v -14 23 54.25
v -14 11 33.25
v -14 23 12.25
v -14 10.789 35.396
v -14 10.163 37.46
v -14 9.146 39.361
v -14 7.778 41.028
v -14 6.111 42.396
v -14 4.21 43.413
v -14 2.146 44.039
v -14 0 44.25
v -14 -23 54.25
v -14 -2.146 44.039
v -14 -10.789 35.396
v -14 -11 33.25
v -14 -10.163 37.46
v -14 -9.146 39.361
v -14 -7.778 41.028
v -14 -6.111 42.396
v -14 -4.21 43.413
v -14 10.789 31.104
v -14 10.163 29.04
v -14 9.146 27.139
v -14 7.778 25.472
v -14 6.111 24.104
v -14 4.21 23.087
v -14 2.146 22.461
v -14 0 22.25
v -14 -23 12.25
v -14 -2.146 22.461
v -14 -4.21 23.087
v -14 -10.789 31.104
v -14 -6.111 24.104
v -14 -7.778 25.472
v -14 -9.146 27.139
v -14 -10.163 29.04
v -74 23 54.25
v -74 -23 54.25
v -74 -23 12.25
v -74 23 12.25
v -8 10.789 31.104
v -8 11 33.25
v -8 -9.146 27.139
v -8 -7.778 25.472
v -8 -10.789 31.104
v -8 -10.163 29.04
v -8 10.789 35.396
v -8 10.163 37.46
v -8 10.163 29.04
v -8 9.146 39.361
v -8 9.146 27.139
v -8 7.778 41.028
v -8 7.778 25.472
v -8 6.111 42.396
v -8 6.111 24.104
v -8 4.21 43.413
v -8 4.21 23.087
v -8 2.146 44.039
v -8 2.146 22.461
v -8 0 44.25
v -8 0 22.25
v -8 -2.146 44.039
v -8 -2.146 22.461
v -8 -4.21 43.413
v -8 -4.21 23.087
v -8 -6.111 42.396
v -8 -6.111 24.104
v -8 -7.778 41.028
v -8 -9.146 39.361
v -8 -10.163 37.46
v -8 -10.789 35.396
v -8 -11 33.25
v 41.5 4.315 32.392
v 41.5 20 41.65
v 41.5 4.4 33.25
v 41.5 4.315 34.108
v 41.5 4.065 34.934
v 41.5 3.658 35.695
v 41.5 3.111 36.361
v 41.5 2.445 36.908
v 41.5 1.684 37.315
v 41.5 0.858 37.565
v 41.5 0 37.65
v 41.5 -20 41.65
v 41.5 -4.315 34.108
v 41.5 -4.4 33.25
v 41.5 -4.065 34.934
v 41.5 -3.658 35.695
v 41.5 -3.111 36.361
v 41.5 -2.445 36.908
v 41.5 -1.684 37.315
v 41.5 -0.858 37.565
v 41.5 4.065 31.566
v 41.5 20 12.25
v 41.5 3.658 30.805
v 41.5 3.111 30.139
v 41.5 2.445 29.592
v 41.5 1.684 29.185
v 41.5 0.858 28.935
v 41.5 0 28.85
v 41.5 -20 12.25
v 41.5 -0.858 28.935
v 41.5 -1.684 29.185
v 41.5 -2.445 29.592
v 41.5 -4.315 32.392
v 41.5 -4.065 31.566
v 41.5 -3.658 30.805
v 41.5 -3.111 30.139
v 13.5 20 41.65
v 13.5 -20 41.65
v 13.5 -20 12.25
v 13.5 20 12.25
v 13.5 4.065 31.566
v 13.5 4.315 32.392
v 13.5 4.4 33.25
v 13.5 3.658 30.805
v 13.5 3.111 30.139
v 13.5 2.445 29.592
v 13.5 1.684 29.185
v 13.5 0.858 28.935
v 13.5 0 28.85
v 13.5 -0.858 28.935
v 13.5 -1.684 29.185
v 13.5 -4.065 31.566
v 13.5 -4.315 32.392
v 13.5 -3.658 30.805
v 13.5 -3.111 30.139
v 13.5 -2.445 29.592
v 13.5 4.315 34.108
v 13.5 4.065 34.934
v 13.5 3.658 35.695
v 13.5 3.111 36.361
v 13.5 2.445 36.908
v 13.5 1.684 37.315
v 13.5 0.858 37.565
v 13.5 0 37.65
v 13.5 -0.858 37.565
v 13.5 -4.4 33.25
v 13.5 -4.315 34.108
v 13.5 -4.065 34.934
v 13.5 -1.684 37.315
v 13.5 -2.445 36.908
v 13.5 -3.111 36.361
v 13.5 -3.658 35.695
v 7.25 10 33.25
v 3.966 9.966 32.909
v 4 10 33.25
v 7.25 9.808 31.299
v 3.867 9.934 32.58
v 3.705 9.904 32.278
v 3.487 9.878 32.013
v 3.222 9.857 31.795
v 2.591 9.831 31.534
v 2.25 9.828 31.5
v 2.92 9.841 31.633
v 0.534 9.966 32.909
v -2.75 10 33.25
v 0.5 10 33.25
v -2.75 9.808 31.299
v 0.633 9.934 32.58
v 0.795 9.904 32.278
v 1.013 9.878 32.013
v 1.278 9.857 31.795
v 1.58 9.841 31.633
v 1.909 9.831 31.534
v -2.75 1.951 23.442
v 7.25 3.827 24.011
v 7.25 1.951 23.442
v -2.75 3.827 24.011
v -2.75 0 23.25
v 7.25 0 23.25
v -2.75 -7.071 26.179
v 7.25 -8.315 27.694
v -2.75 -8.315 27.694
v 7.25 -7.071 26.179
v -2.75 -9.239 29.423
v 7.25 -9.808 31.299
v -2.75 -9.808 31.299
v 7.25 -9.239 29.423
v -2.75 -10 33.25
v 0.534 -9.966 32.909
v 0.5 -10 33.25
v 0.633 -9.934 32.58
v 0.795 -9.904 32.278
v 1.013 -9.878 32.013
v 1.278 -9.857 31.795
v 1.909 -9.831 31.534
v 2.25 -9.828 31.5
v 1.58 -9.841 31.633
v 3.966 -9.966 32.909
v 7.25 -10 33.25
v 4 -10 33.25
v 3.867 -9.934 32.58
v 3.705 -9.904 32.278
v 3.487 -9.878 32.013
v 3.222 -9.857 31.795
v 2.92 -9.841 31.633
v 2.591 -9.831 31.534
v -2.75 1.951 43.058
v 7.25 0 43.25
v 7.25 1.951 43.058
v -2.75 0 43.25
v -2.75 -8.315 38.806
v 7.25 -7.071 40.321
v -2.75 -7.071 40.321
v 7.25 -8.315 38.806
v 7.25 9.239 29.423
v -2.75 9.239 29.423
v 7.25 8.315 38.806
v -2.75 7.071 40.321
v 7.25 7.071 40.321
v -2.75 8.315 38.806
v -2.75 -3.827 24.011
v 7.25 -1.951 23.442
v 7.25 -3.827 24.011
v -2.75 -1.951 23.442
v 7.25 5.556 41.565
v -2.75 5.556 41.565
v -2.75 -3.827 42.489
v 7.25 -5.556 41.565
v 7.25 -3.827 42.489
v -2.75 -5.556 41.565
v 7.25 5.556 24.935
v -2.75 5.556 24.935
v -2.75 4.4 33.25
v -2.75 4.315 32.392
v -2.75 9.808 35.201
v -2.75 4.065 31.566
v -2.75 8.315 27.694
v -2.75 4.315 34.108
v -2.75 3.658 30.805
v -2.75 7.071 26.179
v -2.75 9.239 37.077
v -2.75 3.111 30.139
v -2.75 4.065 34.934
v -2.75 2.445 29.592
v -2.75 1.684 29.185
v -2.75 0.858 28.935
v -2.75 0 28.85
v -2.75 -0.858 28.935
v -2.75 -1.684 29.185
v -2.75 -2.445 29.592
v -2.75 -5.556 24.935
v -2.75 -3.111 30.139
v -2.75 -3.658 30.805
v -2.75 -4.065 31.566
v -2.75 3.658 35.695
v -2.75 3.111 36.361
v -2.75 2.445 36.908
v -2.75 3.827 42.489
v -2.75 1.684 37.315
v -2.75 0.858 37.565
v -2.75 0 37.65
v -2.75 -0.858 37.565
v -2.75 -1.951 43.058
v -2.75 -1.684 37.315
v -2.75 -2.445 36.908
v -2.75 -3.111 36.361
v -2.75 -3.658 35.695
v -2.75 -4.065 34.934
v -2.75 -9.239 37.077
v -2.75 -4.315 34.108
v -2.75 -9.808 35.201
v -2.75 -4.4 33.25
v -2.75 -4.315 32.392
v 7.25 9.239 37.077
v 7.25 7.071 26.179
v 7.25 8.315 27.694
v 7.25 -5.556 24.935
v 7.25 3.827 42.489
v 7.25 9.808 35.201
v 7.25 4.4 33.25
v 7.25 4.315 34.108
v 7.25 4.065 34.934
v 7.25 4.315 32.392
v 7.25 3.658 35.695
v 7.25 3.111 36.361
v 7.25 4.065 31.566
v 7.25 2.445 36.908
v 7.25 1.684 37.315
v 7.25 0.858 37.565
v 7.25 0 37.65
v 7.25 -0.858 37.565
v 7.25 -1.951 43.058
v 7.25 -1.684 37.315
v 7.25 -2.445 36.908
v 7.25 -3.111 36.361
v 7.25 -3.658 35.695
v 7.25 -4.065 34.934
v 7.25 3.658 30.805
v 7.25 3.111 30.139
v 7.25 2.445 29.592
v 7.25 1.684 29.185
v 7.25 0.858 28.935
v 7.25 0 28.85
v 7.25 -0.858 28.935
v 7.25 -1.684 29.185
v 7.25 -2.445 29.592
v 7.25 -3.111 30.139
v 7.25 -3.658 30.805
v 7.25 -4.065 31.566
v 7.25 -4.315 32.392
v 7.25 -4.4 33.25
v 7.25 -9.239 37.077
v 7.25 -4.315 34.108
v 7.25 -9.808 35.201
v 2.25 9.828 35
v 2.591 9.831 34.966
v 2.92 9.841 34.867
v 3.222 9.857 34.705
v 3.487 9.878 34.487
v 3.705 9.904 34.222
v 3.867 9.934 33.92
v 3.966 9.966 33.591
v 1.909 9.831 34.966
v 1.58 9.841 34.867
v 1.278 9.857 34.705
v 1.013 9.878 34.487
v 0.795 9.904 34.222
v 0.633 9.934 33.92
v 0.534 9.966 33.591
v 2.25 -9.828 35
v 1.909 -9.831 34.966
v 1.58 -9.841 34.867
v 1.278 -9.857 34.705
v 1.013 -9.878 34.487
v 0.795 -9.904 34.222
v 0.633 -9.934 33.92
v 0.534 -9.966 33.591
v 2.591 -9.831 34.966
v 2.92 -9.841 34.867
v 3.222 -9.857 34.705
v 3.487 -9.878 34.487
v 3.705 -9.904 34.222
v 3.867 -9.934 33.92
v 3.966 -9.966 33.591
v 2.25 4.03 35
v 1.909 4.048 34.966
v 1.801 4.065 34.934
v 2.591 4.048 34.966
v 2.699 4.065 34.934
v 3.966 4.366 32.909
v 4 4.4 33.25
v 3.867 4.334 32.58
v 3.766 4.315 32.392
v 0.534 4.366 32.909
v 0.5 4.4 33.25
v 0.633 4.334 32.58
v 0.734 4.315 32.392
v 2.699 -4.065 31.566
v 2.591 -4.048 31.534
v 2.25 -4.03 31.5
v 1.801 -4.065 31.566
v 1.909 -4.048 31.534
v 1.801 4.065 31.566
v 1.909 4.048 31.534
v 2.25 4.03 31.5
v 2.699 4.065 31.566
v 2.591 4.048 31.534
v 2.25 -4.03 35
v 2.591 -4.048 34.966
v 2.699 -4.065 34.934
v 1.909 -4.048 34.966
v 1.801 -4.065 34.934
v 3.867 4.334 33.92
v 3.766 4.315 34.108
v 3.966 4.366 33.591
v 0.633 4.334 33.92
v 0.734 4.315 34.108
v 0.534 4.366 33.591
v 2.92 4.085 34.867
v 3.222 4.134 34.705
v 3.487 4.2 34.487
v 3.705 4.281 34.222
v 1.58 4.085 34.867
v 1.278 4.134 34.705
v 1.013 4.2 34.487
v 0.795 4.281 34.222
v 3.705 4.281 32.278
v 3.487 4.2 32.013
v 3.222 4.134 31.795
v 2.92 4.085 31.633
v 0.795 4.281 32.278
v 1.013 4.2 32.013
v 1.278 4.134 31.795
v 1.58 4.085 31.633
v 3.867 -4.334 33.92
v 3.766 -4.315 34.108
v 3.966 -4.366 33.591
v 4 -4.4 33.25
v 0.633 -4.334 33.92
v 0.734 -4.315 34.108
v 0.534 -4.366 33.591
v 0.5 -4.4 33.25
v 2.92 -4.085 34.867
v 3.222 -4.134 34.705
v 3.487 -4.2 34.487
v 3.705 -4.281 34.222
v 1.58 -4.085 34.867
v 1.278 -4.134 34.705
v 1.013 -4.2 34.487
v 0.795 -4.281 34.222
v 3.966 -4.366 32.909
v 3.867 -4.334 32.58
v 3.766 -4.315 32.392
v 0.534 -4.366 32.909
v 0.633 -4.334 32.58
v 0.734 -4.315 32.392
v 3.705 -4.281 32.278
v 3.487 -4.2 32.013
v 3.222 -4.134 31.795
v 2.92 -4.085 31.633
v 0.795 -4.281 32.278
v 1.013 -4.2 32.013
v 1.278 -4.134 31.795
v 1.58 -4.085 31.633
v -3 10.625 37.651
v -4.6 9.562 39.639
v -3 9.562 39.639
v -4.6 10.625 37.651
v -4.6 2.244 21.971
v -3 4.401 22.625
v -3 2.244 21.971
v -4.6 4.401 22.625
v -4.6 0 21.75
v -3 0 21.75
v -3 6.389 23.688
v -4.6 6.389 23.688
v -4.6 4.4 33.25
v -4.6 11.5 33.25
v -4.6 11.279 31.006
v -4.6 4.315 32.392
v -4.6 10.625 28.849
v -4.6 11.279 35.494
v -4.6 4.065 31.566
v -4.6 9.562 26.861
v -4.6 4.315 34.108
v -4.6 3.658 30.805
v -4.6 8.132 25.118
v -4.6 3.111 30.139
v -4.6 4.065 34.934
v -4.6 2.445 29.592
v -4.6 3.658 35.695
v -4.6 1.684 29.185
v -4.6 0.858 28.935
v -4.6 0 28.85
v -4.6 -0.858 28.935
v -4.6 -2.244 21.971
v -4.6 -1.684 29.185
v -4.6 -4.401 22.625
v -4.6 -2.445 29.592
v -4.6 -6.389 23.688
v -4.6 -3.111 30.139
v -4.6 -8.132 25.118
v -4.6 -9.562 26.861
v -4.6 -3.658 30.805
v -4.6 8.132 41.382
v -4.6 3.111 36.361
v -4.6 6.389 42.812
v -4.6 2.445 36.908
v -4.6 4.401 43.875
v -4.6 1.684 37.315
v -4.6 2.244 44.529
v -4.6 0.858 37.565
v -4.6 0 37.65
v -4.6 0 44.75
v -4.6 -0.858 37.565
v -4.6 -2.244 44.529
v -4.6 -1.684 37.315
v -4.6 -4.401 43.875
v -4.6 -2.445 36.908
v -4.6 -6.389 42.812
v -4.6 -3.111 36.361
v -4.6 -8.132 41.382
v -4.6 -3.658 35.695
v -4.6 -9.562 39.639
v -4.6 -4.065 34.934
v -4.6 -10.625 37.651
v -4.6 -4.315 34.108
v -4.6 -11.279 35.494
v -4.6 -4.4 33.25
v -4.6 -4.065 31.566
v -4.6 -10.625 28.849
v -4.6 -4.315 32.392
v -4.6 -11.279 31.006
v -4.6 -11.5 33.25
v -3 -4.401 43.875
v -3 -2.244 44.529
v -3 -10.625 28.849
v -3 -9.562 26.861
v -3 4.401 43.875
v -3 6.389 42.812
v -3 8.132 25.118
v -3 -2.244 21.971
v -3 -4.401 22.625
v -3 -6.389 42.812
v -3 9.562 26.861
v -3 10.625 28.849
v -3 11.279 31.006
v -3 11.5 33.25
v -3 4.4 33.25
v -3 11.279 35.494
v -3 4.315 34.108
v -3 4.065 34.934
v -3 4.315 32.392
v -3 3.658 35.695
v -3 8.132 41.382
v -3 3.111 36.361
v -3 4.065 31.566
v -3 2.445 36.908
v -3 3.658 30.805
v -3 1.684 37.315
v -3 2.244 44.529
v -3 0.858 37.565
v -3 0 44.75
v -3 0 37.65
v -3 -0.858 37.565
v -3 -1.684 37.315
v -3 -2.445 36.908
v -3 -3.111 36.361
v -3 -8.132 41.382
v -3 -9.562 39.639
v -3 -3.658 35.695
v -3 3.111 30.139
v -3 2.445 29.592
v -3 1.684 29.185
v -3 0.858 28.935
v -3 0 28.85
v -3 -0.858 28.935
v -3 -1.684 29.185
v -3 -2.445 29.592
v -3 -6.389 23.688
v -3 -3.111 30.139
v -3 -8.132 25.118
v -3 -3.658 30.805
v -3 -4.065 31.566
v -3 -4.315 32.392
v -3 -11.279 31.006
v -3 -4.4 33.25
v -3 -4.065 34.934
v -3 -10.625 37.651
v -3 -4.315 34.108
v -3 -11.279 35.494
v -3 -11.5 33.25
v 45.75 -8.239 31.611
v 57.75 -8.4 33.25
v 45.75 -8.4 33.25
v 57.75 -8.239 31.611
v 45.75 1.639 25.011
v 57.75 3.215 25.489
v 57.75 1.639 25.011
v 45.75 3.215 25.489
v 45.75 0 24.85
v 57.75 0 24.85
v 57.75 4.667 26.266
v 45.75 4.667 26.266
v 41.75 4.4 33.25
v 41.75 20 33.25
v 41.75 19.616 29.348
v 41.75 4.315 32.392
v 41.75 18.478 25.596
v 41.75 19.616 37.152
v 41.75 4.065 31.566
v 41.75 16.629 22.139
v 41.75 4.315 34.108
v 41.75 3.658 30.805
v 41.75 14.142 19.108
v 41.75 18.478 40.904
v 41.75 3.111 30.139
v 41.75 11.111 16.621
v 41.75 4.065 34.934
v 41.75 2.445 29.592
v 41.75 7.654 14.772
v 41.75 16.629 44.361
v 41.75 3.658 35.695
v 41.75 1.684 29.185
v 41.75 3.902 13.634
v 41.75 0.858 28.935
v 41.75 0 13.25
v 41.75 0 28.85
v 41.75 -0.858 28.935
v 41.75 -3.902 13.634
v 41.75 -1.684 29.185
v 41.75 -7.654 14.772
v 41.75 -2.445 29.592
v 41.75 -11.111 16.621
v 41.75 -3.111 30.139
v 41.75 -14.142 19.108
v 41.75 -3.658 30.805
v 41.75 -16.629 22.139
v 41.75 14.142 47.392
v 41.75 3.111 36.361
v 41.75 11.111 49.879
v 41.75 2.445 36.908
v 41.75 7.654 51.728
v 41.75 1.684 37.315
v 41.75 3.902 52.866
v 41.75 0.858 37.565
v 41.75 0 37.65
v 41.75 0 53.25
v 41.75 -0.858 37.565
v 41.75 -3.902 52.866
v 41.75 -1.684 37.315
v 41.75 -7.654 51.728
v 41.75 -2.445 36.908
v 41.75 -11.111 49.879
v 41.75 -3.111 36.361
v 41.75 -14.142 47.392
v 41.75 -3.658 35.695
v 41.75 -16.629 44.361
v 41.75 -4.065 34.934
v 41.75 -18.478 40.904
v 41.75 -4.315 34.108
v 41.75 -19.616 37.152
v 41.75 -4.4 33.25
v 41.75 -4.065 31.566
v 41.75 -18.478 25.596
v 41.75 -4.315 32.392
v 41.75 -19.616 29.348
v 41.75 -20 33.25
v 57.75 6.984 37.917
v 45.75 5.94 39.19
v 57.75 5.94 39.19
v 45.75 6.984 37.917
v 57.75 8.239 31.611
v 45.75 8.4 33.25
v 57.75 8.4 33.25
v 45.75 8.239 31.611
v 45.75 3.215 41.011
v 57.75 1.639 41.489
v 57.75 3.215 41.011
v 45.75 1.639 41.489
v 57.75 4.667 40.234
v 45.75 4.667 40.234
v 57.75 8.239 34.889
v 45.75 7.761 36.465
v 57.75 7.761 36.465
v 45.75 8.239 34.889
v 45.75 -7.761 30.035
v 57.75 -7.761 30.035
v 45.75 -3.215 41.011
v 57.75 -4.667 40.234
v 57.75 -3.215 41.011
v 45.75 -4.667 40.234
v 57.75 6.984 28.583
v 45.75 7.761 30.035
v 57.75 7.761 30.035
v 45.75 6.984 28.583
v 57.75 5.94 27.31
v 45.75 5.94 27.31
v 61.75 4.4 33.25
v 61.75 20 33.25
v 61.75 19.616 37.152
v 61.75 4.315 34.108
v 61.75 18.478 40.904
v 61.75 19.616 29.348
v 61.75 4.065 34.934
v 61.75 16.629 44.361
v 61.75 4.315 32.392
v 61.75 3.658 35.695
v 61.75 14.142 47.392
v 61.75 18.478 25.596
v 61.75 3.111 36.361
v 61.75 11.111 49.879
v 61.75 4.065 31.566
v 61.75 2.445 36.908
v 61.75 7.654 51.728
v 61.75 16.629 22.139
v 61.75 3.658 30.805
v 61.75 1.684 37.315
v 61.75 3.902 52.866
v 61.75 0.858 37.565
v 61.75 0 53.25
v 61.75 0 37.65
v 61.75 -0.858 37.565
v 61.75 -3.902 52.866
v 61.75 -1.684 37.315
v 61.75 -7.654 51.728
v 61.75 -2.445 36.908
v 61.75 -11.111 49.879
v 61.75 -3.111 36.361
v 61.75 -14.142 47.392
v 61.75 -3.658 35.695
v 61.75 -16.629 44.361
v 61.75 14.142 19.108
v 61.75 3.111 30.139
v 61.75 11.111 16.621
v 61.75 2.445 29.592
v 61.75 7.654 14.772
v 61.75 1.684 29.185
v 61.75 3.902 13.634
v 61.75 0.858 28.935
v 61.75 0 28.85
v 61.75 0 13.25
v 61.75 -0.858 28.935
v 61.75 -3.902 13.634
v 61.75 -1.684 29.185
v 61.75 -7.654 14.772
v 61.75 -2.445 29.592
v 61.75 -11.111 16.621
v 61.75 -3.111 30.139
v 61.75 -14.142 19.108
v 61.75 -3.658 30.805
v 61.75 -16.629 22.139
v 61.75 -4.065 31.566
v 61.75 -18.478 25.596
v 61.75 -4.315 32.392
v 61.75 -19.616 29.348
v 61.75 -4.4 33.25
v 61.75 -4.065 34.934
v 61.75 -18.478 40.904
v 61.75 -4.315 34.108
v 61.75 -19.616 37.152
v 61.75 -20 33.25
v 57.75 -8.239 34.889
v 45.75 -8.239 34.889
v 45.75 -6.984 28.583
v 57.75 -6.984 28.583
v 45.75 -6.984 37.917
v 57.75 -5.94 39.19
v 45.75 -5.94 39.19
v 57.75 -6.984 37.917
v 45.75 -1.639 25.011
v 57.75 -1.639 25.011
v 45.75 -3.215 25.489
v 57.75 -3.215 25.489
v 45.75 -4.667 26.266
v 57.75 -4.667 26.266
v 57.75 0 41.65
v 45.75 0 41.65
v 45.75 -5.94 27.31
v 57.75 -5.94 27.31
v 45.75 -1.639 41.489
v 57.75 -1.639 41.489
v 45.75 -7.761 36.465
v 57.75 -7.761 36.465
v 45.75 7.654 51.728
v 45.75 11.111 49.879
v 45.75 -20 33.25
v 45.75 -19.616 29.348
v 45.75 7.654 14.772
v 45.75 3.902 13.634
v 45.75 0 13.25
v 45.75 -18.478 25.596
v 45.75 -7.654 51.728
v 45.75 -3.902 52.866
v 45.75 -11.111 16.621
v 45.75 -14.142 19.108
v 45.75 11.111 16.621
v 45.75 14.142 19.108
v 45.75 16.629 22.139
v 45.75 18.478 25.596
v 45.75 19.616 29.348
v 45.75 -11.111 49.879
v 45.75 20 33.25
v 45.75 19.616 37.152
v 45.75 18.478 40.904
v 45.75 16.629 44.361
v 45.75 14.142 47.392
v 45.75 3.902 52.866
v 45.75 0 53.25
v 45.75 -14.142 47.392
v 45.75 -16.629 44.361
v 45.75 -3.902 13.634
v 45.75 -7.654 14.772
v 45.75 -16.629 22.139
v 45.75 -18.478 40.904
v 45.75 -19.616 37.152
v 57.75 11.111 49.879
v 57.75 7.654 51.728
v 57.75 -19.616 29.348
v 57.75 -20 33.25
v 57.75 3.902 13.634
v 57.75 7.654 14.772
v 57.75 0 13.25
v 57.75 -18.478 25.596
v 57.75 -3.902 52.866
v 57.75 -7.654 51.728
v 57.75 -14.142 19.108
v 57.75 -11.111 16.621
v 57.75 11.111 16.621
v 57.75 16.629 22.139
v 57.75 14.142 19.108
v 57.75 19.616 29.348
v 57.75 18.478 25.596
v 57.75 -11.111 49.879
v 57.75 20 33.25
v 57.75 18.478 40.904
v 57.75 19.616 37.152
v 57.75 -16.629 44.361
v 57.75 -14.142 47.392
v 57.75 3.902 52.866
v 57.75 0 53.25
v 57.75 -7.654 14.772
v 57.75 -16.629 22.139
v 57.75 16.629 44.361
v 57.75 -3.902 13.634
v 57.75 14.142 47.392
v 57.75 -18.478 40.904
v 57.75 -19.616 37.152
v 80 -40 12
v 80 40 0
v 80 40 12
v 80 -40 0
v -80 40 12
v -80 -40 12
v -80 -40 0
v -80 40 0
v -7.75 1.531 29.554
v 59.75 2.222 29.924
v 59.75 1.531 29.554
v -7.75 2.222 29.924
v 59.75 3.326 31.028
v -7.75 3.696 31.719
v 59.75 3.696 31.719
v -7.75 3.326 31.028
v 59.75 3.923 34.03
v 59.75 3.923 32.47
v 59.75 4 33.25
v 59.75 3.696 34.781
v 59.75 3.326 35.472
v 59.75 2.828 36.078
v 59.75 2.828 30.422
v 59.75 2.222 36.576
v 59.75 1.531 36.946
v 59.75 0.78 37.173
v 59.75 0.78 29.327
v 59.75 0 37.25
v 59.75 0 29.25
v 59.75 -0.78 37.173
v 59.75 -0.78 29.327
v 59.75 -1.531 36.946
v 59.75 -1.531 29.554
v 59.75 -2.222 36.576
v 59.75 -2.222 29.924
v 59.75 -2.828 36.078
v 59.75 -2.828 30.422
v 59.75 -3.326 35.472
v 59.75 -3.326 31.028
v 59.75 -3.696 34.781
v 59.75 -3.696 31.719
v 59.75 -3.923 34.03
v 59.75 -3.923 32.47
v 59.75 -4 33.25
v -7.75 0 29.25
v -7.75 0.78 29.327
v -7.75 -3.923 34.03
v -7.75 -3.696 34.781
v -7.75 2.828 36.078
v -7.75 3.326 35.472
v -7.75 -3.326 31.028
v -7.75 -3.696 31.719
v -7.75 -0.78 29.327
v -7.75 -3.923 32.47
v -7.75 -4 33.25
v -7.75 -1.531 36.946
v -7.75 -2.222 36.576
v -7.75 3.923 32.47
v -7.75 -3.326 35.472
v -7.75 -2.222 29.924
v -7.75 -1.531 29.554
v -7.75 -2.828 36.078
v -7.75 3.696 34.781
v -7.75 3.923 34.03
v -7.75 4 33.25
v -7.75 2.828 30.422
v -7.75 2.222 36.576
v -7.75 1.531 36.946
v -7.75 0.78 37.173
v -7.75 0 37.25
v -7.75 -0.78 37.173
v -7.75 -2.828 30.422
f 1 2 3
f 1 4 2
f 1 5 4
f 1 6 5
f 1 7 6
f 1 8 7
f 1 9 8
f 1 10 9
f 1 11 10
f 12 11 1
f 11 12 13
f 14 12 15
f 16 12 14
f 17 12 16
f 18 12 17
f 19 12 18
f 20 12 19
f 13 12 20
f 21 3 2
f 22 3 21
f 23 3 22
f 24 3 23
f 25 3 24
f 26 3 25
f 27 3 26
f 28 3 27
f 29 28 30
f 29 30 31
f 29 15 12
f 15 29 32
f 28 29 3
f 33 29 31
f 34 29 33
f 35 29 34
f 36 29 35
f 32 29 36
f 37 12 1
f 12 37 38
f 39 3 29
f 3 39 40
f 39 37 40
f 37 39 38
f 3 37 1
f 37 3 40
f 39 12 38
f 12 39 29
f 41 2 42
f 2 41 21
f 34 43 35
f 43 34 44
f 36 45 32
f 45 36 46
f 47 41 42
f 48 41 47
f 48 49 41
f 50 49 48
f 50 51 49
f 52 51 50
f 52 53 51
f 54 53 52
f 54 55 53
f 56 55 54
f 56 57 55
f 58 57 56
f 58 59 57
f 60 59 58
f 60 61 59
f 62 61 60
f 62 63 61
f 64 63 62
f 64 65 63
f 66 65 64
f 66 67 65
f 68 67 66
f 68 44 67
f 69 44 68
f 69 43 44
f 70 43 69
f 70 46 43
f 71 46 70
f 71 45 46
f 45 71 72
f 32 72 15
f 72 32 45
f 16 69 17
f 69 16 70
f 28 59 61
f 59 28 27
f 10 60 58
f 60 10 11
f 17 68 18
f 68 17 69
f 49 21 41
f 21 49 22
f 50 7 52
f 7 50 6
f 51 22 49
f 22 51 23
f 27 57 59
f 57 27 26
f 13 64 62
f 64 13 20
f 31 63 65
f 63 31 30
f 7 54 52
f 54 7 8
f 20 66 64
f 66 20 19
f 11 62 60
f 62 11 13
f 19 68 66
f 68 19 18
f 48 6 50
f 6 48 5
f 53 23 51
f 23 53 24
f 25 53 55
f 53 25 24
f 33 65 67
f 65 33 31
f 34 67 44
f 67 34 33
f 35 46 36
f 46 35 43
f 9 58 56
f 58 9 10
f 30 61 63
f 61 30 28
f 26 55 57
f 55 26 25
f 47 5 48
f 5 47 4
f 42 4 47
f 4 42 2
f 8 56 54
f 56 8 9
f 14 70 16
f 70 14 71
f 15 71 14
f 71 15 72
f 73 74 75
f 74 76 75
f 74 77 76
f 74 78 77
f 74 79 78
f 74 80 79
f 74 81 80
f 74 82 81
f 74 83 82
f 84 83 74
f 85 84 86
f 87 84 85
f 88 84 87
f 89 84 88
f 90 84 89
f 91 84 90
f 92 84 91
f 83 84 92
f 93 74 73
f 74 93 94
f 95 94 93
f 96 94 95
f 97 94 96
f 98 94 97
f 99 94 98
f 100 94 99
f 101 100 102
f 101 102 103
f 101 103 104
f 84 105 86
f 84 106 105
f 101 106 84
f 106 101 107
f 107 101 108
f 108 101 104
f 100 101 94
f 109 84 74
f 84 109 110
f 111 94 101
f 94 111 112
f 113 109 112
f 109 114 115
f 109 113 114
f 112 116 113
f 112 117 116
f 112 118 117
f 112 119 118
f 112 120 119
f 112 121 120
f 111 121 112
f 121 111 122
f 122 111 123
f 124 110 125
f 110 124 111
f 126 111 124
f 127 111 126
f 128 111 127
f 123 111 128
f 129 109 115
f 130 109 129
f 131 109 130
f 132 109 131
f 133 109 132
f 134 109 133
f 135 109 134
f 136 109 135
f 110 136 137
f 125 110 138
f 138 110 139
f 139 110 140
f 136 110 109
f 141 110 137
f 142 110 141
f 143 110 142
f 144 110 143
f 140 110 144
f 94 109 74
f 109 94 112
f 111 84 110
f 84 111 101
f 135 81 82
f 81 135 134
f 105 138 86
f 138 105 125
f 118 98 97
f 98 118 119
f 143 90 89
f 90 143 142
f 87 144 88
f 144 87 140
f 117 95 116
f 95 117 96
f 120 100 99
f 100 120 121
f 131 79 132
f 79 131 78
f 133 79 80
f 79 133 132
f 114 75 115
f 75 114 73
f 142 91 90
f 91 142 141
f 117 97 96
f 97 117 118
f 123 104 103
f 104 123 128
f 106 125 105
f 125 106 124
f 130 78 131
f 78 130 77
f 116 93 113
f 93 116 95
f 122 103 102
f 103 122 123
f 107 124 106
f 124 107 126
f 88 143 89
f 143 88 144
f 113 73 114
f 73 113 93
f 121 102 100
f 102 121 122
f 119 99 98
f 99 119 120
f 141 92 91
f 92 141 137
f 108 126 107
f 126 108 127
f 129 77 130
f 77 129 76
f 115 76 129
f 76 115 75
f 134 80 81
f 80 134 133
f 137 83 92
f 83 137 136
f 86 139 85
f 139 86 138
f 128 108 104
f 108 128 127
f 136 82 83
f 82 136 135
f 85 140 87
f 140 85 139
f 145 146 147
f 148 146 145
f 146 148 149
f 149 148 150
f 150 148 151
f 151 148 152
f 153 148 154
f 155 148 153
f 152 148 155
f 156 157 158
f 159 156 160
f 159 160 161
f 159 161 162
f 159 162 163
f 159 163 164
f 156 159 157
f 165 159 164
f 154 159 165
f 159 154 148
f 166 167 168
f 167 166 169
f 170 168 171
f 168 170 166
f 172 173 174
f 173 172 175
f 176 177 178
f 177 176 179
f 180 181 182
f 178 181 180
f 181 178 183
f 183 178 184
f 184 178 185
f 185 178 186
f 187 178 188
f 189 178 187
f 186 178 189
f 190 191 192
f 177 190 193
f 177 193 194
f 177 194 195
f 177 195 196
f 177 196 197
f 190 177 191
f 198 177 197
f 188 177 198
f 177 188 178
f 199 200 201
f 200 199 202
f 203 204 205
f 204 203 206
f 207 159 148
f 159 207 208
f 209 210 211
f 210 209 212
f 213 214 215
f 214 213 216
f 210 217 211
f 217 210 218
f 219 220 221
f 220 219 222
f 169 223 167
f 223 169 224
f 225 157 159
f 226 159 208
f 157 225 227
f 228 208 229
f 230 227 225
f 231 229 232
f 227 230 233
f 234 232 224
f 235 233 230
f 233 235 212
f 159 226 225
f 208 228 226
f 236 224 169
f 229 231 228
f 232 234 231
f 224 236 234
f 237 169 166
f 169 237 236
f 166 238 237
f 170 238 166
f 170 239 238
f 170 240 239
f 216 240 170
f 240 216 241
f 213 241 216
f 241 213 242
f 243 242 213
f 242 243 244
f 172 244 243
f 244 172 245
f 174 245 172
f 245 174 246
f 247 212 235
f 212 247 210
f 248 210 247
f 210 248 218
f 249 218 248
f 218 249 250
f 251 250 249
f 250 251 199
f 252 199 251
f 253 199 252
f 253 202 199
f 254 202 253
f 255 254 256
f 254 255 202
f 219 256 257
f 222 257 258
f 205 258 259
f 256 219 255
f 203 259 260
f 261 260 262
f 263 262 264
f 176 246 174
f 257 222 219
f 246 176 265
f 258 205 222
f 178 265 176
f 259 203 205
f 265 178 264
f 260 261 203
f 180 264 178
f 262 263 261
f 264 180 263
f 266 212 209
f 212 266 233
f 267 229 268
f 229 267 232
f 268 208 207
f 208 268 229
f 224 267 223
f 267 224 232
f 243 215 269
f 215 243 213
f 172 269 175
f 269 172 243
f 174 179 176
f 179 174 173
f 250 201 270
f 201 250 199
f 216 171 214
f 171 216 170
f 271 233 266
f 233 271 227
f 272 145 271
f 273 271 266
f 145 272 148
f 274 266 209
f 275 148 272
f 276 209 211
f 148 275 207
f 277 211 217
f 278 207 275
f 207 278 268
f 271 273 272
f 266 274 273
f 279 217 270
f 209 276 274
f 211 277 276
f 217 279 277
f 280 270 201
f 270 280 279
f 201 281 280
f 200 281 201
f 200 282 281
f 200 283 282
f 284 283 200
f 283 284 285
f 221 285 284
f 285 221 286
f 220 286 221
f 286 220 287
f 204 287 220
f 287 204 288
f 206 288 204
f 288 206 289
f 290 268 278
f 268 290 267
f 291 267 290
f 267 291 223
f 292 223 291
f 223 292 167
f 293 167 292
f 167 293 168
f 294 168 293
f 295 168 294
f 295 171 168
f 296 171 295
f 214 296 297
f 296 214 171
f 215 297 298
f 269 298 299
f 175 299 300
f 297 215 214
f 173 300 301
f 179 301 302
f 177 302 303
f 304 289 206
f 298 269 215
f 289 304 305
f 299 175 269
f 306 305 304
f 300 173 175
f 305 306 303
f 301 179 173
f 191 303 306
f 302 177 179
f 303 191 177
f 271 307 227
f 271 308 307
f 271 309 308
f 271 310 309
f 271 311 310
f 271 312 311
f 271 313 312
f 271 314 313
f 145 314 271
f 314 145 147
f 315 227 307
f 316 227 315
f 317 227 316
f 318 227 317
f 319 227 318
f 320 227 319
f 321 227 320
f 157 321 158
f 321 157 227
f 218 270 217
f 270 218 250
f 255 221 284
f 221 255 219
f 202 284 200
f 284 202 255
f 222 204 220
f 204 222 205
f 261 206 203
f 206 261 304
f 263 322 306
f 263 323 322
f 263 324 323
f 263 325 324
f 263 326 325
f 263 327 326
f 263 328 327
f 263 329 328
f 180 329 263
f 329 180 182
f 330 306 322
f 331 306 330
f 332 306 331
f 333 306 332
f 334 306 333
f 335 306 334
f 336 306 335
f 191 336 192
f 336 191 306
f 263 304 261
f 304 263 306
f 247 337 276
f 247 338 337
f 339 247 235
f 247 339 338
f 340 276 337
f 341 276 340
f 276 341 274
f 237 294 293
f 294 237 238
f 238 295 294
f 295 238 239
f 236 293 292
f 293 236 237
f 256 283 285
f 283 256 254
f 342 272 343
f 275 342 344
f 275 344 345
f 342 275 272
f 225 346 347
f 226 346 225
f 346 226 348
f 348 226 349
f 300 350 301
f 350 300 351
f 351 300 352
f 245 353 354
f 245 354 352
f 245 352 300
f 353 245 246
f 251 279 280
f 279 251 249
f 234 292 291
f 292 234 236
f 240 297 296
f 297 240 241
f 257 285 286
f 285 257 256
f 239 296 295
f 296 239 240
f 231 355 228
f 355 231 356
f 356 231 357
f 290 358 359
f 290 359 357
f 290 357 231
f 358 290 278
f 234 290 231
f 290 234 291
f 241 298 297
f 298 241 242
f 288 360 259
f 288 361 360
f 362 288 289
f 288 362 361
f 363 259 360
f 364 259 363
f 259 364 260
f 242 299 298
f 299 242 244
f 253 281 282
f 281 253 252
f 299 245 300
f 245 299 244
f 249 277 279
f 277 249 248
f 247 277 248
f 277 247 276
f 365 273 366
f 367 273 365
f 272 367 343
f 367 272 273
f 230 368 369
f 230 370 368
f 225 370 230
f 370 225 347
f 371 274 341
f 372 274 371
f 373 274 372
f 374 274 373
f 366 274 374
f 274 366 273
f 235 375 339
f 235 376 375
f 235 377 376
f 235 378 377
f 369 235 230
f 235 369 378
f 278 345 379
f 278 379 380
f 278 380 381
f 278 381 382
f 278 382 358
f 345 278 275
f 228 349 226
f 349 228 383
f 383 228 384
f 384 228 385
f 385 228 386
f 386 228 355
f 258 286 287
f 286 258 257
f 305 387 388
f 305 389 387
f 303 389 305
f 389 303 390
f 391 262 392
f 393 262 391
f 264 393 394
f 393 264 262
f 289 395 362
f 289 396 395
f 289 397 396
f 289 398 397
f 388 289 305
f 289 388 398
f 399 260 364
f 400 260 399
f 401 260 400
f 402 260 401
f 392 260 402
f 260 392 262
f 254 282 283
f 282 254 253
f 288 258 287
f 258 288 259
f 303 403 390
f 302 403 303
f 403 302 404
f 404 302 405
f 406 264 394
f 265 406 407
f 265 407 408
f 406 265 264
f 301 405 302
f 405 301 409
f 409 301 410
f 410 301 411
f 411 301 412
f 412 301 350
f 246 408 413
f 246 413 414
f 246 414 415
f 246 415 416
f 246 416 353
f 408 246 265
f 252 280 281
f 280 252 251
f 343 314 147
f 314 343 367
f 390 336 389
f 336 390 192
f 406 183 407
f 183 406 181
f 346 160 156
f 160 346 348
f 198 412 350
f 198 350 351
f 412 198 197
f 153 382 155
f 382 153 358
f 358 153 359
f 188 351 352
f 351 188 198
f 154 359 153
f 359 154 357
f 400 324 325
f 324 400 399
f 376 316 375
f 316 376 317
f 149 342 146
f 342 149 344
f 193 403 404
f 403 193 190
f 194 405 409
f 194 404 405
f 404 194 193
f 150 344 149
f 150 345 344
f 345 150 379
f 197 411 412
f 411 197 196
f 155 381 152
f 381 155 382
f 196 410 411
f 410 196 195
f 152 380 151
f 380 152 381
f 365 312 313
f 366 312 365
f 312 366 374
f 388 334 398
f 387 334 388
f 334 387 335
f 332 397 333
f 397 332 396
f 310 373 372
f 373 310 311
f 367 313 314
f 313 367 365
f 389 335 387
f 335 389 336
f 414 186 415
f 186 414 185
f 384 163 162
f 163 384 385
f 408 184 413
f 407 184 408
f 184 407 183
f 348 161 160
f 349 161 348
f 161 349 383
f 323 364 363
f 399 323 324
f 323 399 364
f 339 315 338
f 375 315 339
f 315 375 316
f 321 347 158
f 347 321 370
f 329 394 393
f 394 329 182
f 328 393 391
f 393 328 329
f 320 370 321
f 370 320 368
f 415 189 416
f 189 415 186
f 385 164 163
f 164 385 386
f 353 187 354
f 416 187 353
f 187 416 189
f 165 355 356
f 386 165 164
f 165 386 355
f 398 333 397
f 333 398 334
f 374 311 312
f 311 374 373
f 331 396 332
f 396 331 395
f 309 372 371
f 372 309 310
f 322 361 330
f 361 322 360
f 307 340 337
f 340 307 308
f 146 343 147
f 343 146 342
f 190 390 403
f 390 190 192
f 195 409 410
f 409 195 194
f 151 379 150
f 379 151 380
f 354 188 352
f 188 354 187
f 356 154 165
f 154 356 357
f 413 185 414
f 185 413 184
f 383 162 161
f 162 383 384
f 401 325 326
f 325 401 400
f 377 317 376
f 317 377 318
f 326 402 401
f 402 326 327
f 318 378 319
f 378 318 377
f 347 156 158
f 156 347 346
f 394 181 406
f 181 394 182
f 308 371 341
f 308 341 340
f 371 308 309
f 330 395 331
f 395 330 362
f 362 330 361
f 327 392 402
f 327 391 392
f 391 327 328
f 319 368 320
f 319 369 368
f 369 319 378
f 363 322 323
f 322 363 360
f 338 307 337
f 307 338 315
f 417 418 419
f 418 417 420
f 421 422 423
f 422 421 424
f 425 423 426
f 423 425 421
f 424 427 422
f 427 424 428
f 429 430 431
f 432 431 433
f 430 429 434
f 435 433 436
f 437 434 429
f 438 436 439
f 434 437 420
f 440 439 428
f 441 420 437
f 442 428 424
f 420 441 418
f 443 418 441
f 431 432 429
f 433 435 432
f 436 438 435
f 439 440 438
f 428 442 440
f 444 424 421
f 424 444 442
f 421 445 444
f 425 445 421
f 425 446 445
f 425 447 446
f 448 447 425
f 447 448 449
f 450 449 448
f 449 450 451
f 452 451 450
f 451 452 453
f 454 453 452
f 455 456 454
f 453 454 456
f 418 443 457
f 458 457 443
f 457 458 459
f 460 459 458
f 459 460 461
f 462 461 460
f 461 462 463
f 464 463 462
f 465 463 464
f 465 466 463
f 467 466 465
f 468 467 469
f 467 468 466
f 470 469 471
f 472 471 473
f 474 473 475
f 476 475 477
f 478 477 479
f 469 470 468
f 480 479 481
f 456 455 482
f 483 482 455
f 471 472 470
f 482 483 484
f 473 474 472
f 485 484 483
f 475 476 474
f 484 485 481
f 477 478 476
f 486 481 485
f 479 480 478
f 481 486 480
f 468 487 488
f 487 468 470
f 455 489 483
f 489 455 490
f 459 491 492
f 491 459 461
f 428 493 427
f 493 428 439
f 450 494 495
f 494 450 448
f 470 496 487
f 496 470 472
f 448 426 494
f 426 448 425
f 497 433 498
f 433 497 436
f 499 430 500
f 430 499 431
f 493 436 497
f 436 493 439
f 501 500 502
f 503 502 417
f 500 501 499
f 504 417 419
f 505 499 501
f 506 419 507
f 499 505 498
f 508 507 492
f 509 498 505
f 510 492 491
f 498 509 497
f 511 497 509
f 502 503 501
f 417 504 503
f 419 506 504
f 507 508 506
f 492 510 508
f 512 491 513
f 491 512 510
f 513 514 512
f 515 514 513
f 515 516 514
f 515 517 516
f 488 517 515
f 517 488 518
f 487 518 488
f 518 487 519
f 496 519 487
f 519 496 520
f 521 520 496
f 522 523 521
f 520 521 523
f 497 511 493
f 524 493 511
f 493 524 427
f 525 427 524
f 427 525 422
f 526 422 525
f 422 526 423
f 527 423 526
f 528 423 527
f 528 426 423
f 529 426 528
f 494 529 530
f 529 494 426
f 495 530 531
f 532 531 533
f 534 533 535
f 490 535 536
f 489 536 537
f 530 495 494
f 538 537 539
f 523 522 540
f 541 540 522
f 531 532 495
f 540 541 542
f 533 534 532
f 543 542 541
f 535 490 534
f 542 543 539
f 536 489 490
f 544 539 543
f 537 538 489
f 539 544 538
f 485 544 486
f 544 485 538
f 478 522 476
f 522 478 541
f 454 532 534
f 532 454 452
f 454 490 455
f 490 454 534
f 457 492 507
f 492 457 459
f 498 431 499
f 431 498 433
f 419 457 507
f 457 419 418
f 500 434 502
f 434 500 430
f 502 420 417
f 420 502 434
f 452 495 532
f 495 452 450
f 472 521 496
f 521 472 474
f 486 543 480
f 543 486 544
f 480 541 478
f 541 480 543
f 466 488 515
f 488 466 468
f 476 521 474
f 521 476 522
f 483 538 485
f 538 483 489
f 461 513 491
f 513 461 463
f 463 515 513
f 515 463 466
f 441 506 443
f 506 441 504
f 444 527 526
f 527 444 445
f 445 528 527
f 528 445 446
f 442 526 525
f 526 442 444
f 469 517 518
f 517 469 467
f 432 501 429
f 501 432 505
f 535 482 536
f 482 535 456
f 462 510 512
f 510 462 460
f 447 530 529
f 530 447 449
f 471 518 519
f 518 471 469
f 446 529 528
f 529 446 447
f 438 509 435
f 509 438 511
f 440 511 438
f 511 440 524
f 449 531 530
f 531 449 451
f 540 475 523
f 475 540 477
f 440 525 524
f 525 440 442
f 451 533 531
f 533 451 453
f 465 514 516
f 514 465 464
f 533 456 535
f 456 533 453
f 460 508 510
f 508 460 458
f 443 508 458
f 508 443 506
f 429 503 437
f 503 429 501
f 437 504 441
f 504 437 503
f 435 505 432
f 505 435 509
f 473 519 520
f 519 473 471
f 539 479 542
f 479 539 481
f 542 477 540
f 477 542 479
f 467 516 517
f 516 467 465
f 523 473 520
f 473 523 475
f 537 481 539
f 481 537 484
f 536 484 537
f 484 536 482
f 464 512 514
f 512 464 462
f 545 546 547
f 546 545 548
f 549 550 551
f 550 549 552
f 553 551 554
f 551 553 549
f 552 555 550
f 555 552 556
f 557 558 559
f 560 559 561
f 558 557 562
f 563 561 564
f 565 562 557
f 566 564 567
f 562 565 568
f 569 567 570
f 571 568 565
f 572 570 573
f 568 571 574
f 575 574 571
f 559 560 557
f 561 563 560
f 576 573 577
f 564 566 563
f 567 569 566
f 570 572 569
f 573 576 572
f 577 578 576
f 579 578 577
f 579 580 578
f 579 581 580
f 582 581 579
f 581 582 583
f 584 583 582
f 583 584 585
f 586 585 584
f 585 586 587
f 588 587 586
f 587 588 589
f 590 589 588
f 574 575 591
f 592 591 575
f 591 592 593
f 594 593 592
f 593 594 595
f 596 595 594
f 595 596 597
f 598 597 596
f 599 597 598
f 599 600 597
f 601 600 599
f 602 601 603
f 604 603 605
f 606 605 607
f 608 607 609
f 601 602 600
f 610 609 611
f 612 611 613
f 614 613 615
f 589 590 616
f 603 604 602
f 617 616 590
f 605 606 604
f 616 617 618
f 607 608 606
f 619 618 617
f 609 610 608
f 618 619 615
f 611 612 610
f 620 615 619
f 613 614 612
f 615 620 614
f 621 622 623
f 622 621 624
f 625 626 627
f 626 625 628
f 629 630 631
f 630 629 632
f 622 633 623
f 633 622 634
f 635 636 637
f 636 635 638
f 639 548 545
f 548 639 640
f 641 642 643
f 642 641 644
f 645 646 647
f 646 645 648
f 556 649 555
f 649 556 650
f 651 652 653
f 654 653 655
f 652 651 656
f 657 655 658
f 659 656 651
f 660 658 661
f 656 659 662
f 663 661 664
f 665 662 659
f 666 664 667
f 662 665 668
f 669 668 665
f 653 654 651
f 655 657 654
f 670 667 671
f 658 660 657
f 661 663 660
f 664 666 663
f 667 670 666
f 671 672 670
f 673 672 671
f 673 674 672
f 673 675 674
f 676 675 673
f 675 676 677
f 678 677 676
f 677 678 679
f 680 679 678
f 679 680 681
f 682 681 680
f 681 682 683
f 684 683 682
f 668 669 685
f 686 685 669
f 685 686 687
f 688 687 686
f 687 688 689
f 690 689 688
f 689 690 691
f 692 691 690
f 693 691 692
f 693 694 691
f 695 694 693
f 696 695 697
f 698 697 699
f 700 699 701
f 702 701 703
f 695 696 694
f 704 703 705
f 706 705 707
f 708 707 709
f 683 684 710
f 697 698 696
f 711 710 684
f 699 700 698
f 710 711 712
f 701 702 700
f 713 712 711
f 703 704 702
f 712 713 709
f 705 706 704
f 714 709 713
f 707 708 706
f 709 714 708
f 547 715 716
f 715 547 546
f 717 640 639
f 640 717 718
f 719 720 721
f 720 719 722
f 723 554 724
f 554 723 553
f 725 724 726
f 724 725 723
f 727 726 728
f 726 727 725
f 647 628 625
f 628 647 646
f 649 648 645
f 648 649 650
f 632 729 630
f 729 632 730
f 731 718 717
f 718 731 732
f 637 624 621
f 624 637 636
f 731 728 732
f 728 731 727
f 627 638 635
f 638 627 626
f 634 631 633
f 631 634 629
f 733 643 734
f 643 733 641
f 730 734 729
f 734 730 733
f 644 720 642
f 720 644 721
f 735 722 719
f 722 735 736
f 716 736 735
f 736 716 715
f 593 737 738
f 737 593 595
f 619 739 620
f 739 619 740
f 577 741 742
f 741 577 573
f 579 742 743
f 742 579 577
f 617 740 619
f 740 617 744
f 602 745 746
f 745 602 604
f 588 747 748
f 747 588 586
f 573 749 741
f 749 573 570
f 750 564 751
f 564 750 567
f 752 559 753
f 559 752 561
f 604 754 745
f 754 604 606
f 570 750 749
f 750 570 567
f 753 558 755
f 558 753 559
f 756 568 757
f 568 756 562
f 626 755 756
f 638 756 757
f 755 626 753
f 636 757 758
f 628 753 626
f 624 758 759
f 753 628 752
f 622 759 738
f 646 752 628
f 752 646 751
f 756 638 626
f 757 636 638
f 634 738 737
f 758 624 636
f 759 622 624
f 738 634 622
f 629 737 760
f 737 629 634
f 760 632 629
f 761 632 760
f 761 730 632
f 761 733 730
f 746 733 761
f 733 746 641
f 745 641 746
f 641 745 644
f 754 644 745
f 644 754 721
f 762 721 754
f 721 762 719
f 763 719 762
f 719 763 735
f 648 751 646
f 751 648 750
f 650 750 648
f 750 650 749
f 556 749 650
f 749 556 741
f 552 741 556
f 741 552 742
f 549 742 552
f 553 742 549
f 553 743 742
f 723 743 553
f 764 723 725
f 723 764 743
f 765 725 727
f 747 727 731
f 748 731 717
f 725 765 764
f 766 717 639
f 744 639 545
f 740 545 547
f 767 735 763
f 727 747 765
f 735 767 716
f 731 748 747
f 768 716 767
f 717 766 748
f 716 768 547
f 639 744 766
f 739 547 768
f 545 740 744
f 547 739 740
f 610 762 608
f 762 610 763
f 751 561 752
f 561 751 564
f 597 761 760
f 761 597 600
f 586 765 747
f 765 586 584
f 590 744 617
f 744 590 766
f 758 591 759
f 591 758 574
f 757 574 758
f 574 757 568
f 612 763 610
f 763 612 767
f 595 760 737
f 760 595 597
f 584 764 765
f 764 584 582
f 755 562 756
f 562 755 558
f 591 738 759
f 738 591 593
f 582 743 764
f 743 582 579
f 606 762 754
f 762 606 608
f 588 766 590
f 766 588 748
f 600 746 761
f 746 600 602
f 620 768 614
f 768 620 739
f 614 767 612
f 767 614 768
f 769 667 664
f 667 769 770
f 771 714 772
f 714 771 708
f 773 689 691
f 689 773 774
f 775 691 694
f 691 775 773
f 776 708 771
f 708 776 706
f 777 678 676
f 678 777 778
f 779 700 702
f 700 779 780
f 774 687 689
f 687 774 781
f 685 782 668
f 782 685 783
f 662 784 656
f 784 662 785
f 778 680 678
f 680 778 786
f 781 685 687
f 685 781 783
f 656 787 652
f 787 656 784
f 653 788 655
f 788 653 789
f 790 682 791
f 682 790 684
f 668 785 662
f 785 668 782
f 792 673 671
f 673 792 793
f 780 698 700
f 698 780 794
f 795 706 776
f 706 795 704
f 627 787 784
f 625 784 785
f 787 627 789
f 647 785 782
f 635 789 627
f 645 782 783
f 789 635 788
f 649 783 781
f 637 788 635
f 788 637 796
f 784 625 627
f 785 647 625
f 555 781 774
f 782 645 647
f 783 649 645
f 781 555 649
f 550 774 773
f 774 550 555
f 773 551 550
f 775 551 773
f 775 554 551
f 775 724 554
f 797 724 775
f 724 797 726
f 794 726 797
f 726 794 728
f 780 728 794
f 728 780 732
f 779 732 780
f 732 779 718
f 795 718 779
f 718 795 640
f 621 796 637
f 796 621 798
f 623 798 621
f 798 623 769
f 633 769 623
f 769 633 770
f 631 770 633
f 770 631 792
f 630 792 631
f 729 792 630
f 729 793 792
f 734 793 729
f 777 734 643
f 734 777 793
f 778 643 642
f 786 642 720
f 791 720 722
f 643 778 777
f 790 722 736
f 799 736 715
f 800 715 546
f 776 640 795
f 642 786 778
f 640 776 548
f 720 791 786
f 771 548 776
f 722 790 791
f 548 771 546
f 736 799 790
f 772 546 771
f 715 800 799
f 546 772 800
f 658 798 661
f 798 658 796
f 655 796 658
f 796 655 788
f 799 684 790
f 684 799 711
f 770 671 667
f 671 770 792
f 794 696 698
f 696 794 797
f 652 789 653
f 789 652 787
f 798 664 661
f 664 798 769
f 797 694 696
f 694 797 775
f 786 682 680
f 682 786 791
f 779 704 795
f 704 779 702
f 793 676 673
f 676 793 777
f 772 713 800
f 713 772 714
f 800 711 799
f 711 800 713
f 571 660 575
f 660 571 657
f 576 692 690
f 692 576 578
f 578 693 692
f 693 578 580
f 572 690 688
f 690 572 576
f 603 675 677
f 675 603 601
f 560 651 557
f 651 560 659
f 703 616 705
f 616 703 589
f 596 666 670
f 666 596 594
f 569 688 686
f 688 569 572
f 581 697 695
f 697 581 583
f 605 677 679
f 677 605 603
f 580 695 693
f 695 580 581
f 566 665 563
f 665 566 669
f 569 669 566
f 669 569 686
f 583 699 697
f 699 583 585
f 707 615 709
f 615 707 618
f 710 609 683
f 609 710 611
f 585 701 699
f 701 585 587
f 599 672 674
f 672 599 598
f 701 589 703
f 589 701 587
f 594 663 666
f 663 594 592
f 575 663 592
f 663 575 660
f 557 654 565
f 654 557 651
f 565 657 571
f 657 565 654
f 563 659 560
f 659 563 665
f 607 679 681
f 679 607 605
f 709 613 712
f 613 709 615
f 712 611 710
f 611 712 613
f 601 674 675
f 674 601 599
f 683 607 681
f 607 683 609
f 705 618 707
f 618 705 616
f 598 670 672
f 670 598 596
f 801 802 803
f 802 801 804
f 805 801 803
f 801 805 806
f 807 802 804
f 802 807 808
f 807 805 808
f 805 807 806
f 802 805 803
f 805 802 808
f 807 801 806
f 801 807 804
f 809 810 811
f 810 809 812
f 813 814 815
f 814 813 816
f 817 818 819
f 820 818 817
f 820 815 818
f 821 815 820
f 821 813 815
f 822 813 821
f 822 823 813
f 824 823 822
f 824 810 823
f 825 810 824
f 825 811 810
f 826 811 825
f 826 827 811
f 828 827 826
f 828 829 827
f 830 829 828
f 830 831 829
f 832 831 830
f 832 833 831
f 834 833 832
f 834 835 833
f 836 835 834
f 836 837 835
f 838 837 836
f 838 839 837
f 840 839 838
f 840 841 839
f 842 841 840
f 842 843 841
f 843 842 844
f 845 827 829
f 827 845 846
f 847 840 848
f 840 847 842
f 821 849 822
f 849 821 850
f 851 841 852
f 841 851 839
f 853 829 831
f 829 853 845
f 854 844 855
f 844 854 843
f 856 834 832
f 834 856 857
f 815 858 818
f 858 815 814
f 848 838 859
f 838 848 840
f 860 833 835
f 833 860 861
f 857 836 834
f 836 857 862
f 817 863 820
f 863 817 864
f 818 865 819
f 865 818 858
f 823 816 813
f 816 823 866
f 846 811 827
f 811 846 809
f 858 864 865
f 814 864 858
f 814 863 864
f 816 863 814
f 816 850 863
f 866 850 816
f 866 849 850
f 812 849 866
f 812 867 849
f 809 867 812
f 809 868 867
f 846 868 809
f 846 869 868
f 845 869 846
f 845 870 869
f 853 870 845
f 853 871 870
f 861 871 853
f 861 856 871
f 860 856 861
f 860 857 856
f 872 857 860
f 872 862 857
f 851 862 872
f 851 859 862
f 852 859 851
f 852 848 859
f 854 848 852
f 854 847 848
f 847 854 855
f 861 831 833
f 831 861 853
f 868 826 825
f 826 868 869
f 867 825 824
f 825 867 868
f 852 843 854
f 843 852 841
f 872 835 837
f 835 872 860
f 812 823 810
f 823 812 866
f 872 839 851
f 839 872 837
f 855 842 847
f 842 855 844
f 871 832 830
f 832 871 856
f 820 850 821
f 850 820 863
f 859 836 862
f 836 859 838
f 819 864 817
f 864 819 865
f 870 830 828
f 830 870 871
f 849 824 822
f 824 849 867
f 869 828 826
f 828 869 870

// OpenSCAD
$fn = 32;

// ------------------------------------------------------------------------
// Motor drive station: motor 60 x 42 mm, shaft d8, pulley d40
// Every part is its own module, assembly() places every instance.
// ------------------------------------------------------------------------

// --- part 1 ---
module station_bed() {
  difference() {
    translate([-80, -40, 0]) cube([160, 80, 12]);
  }
}

// --- part 2 ---
module drive_motor() {
  union() {
    translate([-30, -23, 0]) cube([60, 46, 42]);
    translate([33, 0, 21]) rotate([0, 90, 0]) cylinder(h = 6, d = 22, center = true);
  }
}

// --- part 3 ---
module pillow_block() {
  difference() {
    translate([-14, -20, 0]) cube([28, 40, 29.4]);
    translate([0, 0, 21]) rotate([0, 90, 0]) cylinder(h = 30, d = 8.8, center = true);
  }
}

// --- part 4 ---
module drive_shaft() {
  translate([0, 0, -33.75]) cylinder(h = 67.5, d = 8);
}

// --- part 5 ---
module shaft_collar() {
  difference() {
    cylinder(h = 10, d = 20);
    translate([0, 0, -1]) cylinder(h = 12, d = 8.8);
    translate([0, 0, 5]) rotate([90, 0, 0]) cylinder(h = 22, d = 3.5, center = true);
  }
}

// --- part 6 ---
module collar_washer() {
  difference() {
      translate([0, 0, 0]) cylinder(h = 1.6, d = 23);
      translate([0, 0, -1]) cylinder(h = 3.6, d = 8.8);
    }
}

// --- part 7 ---
module drive_pulley() {
  difference() {
    union() {
      cylinder(h = 20, d = 16.8);
      cylinder(h = 4, d = 40);
      translate([0, 0, 16]) cylinder(h = 4, d = 40);
    }
    translate([0, 0, -1]) cylinder(h = 22, d = 8.8);
  }
}

// --- assembly ---
module assembly() {
  color([0.80, 0.24, 0.20]) translate([0, 0, 0]) rotate([0, 0, 0]) station_bed();
  color([0.20, 0.45, 0.75]) translate([-44, 0, 12.25]) rotate([0, 0, 0]) drive_motor();
  color([0.25, 0.62, 0.32]) translate([27.5, 0, 12.25]) rotate([0, 0, 0]) pillow_block();
  color([0.92, 0.70, 0.18]) translate([26, 0, 33.25]) rotate([0, 90, 0]) drive_shaft();
  color([0.58, 0.35, 0.70]) translate([-2.75, 0, 33.25]) rotate([0, 90, 0]) shaft_collar();
  color([0.16, 0.66, 0.66]) translate([-4.6, 0, 33.25]) rotate([0, 90, 0]) collar_washer();
  color([0.85, 0.48, 0.18]) translate([41.75, 0, 33.25]) rotate([0, 90, 0]) drive_pulley();
}

assembly();
